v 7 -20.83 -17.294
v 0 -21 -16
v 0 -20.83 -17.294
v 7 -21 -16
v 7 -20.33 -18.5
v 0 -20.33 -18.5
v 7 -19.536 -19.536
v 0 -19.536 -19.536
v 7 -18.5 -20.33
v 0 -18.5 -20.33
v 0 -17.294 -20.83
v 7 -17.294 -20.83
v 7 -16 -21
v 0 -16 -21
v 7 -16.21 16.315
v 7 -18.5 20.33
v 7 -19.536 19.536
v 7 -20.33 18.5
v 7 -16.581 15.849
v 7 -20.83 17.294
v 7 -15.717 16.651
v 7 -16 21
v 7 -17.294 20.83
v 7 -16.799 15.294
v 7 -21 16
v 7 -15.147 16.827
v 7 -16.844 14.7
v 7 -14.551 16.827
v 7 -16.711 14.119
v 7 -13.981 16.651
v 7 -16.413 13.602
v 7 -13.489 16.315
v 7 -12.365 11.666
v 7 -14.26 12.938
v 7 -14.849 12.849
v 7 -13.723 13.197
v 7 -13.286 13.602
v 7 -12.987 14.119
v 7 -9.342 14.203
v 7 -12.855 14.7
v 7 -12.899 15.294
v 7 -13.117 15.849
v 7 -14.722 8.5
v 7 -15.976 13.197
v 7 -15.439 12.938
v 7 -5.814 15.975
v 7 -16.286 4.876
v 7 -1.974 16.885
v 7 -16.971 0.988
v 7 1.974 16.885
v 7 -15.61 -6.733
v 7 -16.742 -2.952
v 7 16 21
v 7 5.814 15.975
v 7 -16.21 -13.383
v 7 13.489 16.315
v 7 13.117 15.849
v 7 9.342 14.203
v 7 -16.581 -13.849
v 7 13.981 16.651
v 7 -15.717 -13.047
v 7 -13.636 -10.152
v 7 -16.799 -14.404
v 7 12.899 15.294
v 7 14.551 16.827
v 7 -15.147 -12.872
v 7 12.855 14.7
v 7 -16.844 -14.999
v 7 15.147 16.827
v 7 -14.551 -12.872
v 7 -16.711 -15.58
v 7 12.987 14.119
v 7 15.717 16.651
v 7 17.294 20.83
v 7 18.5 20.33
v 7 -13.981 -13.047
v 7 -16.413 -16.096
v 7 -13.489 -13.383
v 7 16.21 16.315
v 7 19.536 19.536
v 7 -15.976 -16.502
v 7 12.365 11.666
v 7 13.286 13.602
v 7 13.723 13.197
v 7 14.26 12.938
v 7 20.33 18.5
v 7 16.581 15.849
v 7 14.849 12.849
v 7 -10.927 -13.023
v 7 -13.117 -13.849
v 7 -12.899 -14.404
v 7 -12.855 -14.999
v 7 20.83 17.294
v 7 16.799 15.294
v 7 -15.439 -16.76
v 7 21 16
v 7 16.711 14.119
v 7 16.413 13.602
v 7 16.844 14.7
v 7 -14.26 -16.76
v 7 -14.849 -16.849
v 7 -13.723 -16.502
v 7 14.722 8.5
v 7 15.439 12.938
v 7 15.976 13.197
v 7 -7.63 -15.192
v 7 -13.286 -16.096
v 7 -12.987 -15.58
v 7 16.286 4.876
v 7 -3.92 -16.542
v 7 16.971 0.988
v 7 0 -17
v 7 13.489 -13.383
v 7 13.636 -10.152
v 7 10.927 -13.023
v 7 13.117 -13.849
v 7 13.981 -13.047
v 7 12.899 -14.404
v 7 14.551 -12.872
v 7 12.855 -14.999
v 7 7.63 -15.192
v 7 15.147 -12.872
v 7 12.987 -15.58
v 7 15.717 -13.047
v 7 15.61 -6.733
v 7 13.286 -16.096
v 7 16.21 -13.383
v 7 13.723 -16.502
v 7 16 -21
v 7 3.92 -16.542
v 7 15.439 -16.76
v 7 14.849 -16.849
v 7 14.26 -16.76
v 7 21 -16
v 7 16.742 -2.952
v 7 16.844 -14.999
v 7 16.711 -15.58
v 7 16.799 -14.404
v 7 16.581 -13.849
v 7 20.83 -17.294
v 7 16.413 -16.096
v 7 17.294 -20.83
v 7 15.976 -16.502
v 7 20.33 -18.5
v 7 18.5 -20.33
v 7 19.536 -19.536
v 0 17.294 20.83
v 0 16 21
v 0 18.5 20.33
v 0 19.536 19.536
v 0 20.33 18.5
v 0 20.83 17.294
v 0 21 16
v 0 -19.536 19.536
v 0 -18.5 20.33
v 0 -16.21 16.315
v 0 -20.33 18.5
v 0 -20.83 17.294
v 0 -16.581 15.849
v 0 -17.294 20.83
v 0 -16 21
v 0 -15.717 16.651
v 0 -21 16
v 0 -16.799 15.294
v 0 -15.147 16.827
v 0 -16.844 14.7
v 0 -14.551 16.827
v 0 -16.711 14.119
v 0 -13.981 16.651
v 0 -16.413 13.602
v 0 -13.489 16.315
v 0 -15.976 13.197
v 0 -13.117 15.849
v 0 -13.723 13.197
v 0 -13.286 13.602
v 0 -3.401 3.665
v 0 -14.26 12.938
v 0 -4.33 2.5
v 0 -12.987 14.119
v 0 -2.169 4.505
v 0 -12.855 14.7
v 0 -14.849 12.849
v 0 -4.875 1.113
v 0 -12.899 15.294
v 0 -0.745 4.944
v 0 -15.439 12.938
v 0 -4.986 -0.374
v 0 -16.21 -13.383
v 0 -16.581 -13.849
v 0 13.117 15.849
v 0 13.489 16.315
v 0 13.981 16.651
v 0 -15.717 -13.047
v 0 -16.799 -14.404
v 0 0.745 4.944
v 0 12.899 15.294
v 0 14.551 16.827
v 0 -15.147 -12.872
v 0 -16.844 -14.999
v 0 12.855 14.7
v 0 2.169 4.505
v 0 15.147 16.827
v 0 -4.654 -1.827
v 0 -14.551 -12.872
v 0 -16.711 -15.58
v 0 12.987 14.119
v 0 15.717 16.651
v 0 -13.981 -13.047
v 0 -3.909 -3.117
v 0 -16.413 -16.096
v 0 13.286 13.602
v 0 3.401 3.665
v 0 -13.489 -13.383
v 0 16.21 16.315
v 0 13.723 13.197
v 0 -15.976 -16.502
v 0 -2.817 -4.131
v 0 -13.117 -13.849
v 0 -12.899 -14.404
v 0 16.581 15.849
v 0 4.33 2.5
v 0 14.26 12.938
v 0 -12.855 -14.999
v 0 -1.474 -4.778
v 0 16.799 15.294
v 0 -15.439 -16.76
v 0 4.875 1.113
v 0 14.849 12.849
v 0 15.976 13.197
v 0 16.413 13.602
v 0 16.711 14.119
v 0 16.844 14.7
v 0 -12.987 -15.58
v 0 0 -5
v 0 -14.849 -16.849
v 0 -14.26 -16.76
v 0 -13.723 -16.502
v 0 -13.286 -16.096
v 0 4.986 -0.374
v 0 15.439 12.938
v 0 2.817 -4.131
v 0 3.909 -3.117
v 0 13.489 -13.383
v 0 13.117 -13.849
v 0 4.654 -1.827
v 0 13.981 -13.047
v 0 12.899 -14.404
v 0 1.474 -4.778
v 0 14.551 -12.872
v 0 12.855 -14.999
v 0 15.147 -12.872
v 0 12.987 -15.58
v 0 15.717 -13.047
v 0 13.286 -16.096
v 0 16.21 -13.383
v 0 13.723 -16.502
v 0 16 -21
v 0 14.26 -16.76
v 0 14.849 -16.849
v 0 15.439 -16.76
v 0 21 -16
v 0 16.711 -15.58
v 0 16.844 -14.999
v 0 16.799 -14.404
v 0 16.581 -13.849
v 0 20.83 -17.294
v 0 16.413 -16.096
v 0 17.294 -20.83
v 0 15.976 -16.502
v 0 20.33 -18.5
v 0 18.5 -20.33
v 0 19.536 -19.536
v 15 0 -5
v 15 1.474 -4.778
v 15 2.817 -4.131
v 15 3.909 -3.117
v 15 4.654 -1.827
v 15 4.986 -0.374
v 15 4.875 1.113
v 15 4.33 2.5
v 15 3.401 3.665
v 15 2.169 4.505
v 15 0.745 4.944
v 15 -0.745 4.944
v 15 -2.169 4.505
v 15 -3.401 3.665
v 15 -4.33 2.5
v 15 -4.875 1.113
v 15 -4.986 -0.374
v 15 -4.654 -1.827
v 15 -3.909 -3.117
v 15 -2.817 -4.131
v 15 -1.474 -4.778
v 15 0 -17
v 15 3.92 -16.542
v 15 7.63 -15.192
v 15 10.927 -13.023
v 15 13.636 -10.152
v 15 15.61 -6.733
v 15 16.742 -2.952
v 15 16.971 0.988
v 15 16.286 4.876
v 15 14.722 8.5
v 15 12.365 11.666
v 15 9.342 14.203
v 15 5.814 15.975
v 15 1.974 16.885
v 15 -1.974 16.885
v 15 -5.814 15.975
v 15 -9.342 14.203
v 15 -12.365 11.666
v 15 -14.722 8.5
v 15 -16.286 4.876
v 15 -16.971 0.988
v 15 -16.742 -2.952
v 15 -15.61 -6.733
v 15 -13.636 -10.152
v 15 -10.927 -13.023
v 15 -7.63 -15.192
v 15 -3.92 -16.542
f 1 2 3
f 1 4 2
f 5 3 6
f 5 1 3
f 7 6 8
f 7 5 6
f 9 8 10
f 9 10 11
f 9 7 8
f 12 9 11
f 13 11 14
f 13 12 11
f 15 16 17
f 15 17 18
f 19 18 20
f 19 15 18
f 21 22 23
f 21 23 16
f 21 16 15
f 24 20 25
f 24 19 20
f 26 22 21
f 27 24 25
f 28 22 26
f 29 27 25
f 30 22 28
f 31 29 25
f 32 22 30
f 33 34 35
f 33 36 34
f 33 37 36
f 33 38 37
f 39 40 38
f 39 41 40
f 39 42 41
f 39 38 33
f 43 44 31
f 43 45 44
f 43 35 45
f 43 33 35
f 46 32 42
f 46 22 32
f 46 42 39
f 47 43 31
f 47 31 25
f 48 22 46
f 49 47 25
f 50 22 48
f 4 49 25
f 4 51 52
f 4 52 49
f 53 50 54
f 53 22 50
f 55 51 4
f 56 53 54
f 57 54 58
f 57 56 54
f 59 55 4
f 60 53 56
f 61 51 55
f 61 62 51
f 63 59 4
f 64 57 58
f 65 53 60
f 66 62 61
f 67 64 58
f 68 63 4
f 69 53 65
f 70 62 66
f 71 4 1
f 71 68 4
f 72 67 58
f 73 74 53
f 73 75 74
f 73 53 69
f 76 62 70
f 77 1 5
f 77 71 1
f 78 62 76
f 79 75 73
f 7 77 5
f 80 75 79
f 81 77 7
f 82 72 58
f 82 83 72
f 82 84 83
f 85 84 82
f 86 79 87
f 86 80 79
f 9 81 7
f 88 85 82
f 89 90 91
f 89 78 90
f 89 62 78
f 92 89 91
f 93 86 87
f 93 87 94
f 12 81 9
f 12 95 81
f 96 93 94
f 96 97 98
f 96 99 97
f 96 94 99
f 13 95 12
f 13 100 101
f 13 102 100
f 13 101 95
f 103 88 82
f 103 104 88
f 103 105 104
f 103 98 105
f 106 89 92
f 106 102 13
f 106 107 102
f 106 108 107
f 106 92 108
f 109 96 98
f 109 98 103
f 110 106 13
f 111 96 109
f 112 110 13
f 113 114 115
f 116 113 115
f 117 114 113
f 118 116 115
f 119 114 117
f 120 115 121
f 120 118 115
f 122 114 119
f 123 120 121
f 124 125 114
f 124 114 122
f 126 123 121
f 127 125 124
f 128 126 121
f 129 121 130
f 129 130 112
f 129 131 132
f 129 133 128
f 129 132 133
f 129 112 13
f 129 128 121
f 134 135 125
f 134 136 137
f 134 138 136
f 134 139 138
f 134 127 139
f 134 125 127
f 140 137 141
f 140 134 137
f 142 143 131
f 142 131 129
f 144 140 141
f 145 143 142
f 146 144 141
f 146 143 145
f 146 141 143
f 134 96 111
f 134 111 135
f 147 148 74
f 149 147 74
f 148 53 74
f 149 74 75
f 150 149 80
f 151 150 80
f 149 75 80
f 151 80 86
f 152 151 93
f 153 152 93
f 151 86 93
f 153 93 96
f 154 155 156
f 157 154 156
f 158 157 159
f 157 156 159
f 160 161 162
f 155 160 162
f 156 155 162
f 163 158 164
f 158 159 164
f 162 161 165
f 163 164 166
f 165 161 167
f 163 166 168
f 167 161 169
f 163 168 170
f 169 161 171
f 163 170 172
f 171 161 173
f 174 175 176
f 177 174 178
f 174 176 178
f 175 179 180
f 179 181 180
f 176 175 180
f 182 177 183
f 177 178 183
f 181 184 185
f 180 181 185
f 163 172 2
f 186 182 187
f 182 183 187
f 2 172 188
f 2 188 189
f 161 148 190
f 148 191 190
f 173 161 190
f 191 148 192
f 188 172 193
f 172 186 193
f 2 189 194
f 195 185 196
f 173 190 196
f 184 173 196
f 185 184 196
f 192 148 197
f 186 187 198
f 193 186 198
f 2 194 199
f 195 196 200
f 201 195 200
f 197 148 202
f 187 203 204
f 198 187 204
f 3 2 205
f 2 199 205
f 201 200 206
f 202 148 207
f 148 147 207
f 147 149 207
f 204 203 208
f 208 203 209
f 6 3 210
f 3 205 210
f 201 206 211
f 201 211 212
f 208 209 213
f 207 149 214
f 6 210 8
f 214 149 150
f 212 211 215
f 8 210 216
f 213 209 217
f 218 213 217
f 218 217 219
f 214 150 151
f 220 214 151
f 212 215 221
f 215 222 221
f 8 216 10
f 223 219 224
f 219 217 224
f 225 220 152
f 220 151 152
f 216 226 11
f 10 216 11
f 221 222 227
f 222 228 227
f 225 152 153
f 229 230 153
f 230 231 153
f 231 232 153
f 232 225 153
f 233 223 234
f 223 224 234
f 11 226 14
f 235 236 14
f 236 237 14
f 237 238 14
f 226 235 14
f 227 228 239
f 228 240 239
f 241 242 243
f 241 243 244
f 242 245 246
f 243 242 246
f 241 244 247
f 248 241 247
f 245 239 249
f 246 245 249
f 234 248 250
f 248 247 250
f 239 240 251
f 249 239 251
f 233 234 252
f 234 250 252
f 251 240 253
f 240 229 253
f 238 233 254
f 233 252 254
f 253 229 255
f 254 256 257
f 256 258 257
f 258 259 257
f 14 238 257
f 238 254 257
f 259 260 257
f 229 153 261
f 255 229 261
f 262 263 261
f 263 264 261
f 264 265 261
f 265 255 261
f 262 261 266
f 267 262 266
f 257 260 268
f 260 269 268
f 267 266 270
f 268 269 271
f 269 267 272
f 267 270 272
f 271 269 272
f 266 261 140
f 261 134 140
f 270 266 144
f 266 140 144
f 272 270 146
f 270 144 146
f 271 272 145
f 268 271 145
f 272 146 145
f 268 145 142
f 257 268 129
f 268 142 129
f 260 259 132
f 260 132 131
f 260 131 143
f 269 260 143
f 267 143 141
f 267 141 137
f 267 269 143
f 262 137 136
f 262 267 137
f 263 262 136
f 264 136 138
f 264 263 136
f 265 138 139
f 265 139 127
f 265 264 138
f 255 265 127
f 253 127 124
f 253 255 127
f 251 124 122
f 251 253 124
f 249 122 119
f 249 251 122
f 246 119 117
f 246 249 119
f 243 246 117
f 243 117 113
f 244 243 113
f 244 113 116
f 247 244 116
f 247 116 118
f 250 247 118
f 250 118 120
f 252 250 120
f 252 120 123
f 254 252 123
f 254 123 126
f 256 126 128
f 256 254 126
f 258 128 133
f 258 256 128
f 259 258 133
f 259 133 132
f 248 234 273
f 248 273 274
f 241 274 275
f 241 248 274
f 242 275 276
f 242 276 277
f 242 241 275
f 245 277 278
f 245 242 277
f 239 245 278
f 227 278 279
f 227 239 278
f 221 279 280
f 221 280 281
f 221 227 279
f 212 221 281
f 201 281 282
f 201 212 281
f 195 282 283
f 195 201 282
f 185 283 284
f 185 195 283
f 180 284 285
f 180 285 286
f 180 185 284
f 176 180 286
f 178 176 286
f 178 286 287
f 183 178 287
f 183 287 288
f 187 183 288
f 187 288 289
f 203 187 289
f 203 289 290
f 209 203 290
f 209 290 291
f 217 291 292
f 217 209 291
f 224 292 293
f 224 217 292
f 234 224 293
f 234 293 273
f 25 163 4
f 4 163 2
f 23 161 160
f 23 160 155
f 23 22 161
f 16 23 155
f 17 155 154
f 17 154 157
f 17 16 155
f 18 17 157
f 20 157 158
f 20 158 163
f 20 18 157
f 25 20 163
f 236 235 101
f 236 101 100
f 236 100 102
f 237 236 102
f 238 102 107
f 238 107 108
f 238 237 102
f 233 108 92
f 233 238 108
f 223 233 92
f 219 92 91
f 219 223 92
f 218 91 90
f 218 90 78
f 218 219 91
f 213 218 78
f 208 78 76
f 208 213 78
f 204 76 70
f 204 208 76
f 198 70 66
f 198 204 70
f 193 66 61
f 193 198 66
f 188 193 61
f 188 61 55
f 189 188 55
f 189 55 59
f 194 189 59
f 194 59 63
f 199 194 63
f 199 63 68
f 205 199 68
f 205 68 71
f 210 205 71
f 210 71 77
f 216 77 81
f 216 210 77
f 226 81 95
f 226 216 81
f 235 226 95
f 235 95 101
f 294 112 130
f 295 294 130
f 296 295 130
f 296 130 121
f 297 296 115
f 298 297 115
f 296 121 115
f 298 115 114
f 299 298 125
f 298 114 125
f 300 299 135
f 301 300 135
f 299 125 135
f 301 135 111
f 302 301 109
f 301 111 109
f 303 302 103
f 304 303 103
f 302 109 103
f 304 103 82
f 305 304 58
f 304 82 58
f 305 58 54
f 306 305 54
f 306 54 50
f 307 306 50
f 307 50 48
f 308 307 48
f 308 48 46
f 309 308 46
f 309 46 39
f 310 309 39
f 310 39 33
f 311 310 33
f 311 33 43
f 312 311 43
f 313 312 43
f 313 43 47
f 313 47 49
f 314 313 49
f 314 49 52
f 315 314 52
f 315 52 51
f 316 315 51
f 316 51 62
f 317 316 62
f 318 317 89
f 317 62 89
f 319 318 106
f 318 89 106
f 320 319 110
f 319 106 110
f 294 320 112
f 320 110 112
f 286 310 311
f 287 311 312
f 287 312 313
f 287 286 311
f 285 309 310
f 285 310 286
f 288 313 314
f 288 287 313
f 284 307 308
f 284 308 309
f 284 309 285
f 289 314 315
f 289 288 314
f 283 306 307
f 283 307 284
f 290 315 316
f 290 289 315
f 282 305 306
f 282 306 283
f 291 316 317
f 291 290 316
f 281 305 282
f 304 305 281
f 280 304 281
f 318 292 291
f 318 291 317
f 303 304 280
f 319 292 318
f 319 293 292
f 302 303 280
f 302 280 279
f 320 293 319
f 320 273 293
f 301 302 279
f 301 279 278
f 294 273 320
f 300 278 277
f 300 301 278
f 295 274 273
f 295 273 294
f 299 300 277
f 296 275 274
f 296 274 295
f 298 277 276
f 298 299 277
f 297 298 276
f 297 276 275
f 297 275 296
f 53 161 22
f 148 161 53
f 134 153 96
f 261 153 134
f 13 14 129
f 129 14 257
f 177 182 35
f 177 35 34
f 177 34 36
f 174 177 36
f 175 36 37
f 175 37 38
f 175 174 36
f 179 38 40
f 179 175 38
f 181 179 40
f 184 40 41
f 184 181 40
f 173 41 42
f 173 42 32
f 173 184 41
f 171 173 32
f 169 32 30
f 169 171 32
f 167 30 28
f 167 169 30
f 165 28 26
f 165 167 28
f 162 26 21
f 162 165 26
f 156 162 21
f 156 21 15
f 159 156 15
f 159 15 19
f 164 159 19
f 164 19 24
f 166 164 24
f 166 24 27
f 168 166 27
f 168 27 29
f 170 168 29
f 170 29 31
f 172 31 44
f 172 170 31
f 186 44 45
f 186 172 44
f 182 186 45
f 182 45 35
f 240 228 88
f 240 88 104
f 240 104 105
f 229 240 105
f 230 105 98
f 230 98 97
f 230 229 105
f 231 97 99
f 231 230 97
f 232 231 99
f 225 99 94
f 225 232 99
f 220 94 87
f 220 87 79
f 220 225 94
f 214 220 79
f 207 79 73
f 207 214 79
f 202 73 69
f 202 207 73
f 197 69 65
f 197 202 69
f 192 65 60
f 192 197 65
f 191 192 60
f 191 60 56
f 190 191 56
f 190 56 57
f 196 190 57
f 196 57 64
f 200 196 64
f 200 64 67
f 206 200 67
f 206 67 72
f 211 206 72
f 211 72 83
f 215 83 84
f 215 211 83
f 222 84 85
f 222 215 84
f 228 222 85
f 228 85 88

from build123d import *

# Parameters (mm, degrees)
SKETCH1_W           = 42
SKETCH1_H           = 42
SKETCH1_R           = 2
SKETCH1_R_2         = 10
BOSS_EXTRUDE1_DEPTH = 7
SKETCH2_R           = 17
SKETCH2_R_2         = 5
BOSS_EXTRUDE2_DEPTH = 15
FILLET1_R           = 5


with BuildPart() as part:
    # Sketch1 → Boss-Extrude1 (new body)
    with BuildSketch(Plane(origin=(0, 0, 0), x_dir=(0, 0, -1), z_dir=(1, 0, 0))):
        Rectangle(SKETCH1_W, SKETCH1_H)
        with Locations((-14.849242405, 14.849242405)):
            Circle(SKETCH1_R, mode=Mode.SUBTRACT)
        with Locations((14.849242405, 14.849242405)):
            Circle(SKETCH1_R, mode=Mode.SUBTRACT)
        with Locations((14.849242405, -14.849242405)):
            Circle(SKETCH1_R, mode=Mode.SUBTRACT)
        with Locations((-14.849242405, -14.849242405)):
            Circle(SKETCH1_R, mode=Mode.SUBTRACT)
        Circle(SKETCH1_R_2, mode=Mode.SUBTRACT)
    extrude(amount=BOSS_EXTRUDE1_DEPTH)

    # Sketch2 → Boss-Extrude2 (add)
    with BuildSketch(Plane(origin=(0, 0, 0), x_dir=(0, 0, -1), z_dir=(1, 0, 0))):
        Circle(SKETCH2_R)
        Circle(SKETCH2_R_2, mode=Mode.SUBTRACT)
    extrude(amount=BOSS_EXTRUDE2_DEPTH)

    # Fillet1
    fillet1_edges = [part.edges().sort_by_distance(p)[0] for p in [
        (3.5, 21, 21),
        (3.5, 21, -21),
        (3.5, -21, -21),
        (3.5, -21, 21),
    ]]
    fillet(fillet1_edges, radius=FILLET1_R)


solid = part.part
